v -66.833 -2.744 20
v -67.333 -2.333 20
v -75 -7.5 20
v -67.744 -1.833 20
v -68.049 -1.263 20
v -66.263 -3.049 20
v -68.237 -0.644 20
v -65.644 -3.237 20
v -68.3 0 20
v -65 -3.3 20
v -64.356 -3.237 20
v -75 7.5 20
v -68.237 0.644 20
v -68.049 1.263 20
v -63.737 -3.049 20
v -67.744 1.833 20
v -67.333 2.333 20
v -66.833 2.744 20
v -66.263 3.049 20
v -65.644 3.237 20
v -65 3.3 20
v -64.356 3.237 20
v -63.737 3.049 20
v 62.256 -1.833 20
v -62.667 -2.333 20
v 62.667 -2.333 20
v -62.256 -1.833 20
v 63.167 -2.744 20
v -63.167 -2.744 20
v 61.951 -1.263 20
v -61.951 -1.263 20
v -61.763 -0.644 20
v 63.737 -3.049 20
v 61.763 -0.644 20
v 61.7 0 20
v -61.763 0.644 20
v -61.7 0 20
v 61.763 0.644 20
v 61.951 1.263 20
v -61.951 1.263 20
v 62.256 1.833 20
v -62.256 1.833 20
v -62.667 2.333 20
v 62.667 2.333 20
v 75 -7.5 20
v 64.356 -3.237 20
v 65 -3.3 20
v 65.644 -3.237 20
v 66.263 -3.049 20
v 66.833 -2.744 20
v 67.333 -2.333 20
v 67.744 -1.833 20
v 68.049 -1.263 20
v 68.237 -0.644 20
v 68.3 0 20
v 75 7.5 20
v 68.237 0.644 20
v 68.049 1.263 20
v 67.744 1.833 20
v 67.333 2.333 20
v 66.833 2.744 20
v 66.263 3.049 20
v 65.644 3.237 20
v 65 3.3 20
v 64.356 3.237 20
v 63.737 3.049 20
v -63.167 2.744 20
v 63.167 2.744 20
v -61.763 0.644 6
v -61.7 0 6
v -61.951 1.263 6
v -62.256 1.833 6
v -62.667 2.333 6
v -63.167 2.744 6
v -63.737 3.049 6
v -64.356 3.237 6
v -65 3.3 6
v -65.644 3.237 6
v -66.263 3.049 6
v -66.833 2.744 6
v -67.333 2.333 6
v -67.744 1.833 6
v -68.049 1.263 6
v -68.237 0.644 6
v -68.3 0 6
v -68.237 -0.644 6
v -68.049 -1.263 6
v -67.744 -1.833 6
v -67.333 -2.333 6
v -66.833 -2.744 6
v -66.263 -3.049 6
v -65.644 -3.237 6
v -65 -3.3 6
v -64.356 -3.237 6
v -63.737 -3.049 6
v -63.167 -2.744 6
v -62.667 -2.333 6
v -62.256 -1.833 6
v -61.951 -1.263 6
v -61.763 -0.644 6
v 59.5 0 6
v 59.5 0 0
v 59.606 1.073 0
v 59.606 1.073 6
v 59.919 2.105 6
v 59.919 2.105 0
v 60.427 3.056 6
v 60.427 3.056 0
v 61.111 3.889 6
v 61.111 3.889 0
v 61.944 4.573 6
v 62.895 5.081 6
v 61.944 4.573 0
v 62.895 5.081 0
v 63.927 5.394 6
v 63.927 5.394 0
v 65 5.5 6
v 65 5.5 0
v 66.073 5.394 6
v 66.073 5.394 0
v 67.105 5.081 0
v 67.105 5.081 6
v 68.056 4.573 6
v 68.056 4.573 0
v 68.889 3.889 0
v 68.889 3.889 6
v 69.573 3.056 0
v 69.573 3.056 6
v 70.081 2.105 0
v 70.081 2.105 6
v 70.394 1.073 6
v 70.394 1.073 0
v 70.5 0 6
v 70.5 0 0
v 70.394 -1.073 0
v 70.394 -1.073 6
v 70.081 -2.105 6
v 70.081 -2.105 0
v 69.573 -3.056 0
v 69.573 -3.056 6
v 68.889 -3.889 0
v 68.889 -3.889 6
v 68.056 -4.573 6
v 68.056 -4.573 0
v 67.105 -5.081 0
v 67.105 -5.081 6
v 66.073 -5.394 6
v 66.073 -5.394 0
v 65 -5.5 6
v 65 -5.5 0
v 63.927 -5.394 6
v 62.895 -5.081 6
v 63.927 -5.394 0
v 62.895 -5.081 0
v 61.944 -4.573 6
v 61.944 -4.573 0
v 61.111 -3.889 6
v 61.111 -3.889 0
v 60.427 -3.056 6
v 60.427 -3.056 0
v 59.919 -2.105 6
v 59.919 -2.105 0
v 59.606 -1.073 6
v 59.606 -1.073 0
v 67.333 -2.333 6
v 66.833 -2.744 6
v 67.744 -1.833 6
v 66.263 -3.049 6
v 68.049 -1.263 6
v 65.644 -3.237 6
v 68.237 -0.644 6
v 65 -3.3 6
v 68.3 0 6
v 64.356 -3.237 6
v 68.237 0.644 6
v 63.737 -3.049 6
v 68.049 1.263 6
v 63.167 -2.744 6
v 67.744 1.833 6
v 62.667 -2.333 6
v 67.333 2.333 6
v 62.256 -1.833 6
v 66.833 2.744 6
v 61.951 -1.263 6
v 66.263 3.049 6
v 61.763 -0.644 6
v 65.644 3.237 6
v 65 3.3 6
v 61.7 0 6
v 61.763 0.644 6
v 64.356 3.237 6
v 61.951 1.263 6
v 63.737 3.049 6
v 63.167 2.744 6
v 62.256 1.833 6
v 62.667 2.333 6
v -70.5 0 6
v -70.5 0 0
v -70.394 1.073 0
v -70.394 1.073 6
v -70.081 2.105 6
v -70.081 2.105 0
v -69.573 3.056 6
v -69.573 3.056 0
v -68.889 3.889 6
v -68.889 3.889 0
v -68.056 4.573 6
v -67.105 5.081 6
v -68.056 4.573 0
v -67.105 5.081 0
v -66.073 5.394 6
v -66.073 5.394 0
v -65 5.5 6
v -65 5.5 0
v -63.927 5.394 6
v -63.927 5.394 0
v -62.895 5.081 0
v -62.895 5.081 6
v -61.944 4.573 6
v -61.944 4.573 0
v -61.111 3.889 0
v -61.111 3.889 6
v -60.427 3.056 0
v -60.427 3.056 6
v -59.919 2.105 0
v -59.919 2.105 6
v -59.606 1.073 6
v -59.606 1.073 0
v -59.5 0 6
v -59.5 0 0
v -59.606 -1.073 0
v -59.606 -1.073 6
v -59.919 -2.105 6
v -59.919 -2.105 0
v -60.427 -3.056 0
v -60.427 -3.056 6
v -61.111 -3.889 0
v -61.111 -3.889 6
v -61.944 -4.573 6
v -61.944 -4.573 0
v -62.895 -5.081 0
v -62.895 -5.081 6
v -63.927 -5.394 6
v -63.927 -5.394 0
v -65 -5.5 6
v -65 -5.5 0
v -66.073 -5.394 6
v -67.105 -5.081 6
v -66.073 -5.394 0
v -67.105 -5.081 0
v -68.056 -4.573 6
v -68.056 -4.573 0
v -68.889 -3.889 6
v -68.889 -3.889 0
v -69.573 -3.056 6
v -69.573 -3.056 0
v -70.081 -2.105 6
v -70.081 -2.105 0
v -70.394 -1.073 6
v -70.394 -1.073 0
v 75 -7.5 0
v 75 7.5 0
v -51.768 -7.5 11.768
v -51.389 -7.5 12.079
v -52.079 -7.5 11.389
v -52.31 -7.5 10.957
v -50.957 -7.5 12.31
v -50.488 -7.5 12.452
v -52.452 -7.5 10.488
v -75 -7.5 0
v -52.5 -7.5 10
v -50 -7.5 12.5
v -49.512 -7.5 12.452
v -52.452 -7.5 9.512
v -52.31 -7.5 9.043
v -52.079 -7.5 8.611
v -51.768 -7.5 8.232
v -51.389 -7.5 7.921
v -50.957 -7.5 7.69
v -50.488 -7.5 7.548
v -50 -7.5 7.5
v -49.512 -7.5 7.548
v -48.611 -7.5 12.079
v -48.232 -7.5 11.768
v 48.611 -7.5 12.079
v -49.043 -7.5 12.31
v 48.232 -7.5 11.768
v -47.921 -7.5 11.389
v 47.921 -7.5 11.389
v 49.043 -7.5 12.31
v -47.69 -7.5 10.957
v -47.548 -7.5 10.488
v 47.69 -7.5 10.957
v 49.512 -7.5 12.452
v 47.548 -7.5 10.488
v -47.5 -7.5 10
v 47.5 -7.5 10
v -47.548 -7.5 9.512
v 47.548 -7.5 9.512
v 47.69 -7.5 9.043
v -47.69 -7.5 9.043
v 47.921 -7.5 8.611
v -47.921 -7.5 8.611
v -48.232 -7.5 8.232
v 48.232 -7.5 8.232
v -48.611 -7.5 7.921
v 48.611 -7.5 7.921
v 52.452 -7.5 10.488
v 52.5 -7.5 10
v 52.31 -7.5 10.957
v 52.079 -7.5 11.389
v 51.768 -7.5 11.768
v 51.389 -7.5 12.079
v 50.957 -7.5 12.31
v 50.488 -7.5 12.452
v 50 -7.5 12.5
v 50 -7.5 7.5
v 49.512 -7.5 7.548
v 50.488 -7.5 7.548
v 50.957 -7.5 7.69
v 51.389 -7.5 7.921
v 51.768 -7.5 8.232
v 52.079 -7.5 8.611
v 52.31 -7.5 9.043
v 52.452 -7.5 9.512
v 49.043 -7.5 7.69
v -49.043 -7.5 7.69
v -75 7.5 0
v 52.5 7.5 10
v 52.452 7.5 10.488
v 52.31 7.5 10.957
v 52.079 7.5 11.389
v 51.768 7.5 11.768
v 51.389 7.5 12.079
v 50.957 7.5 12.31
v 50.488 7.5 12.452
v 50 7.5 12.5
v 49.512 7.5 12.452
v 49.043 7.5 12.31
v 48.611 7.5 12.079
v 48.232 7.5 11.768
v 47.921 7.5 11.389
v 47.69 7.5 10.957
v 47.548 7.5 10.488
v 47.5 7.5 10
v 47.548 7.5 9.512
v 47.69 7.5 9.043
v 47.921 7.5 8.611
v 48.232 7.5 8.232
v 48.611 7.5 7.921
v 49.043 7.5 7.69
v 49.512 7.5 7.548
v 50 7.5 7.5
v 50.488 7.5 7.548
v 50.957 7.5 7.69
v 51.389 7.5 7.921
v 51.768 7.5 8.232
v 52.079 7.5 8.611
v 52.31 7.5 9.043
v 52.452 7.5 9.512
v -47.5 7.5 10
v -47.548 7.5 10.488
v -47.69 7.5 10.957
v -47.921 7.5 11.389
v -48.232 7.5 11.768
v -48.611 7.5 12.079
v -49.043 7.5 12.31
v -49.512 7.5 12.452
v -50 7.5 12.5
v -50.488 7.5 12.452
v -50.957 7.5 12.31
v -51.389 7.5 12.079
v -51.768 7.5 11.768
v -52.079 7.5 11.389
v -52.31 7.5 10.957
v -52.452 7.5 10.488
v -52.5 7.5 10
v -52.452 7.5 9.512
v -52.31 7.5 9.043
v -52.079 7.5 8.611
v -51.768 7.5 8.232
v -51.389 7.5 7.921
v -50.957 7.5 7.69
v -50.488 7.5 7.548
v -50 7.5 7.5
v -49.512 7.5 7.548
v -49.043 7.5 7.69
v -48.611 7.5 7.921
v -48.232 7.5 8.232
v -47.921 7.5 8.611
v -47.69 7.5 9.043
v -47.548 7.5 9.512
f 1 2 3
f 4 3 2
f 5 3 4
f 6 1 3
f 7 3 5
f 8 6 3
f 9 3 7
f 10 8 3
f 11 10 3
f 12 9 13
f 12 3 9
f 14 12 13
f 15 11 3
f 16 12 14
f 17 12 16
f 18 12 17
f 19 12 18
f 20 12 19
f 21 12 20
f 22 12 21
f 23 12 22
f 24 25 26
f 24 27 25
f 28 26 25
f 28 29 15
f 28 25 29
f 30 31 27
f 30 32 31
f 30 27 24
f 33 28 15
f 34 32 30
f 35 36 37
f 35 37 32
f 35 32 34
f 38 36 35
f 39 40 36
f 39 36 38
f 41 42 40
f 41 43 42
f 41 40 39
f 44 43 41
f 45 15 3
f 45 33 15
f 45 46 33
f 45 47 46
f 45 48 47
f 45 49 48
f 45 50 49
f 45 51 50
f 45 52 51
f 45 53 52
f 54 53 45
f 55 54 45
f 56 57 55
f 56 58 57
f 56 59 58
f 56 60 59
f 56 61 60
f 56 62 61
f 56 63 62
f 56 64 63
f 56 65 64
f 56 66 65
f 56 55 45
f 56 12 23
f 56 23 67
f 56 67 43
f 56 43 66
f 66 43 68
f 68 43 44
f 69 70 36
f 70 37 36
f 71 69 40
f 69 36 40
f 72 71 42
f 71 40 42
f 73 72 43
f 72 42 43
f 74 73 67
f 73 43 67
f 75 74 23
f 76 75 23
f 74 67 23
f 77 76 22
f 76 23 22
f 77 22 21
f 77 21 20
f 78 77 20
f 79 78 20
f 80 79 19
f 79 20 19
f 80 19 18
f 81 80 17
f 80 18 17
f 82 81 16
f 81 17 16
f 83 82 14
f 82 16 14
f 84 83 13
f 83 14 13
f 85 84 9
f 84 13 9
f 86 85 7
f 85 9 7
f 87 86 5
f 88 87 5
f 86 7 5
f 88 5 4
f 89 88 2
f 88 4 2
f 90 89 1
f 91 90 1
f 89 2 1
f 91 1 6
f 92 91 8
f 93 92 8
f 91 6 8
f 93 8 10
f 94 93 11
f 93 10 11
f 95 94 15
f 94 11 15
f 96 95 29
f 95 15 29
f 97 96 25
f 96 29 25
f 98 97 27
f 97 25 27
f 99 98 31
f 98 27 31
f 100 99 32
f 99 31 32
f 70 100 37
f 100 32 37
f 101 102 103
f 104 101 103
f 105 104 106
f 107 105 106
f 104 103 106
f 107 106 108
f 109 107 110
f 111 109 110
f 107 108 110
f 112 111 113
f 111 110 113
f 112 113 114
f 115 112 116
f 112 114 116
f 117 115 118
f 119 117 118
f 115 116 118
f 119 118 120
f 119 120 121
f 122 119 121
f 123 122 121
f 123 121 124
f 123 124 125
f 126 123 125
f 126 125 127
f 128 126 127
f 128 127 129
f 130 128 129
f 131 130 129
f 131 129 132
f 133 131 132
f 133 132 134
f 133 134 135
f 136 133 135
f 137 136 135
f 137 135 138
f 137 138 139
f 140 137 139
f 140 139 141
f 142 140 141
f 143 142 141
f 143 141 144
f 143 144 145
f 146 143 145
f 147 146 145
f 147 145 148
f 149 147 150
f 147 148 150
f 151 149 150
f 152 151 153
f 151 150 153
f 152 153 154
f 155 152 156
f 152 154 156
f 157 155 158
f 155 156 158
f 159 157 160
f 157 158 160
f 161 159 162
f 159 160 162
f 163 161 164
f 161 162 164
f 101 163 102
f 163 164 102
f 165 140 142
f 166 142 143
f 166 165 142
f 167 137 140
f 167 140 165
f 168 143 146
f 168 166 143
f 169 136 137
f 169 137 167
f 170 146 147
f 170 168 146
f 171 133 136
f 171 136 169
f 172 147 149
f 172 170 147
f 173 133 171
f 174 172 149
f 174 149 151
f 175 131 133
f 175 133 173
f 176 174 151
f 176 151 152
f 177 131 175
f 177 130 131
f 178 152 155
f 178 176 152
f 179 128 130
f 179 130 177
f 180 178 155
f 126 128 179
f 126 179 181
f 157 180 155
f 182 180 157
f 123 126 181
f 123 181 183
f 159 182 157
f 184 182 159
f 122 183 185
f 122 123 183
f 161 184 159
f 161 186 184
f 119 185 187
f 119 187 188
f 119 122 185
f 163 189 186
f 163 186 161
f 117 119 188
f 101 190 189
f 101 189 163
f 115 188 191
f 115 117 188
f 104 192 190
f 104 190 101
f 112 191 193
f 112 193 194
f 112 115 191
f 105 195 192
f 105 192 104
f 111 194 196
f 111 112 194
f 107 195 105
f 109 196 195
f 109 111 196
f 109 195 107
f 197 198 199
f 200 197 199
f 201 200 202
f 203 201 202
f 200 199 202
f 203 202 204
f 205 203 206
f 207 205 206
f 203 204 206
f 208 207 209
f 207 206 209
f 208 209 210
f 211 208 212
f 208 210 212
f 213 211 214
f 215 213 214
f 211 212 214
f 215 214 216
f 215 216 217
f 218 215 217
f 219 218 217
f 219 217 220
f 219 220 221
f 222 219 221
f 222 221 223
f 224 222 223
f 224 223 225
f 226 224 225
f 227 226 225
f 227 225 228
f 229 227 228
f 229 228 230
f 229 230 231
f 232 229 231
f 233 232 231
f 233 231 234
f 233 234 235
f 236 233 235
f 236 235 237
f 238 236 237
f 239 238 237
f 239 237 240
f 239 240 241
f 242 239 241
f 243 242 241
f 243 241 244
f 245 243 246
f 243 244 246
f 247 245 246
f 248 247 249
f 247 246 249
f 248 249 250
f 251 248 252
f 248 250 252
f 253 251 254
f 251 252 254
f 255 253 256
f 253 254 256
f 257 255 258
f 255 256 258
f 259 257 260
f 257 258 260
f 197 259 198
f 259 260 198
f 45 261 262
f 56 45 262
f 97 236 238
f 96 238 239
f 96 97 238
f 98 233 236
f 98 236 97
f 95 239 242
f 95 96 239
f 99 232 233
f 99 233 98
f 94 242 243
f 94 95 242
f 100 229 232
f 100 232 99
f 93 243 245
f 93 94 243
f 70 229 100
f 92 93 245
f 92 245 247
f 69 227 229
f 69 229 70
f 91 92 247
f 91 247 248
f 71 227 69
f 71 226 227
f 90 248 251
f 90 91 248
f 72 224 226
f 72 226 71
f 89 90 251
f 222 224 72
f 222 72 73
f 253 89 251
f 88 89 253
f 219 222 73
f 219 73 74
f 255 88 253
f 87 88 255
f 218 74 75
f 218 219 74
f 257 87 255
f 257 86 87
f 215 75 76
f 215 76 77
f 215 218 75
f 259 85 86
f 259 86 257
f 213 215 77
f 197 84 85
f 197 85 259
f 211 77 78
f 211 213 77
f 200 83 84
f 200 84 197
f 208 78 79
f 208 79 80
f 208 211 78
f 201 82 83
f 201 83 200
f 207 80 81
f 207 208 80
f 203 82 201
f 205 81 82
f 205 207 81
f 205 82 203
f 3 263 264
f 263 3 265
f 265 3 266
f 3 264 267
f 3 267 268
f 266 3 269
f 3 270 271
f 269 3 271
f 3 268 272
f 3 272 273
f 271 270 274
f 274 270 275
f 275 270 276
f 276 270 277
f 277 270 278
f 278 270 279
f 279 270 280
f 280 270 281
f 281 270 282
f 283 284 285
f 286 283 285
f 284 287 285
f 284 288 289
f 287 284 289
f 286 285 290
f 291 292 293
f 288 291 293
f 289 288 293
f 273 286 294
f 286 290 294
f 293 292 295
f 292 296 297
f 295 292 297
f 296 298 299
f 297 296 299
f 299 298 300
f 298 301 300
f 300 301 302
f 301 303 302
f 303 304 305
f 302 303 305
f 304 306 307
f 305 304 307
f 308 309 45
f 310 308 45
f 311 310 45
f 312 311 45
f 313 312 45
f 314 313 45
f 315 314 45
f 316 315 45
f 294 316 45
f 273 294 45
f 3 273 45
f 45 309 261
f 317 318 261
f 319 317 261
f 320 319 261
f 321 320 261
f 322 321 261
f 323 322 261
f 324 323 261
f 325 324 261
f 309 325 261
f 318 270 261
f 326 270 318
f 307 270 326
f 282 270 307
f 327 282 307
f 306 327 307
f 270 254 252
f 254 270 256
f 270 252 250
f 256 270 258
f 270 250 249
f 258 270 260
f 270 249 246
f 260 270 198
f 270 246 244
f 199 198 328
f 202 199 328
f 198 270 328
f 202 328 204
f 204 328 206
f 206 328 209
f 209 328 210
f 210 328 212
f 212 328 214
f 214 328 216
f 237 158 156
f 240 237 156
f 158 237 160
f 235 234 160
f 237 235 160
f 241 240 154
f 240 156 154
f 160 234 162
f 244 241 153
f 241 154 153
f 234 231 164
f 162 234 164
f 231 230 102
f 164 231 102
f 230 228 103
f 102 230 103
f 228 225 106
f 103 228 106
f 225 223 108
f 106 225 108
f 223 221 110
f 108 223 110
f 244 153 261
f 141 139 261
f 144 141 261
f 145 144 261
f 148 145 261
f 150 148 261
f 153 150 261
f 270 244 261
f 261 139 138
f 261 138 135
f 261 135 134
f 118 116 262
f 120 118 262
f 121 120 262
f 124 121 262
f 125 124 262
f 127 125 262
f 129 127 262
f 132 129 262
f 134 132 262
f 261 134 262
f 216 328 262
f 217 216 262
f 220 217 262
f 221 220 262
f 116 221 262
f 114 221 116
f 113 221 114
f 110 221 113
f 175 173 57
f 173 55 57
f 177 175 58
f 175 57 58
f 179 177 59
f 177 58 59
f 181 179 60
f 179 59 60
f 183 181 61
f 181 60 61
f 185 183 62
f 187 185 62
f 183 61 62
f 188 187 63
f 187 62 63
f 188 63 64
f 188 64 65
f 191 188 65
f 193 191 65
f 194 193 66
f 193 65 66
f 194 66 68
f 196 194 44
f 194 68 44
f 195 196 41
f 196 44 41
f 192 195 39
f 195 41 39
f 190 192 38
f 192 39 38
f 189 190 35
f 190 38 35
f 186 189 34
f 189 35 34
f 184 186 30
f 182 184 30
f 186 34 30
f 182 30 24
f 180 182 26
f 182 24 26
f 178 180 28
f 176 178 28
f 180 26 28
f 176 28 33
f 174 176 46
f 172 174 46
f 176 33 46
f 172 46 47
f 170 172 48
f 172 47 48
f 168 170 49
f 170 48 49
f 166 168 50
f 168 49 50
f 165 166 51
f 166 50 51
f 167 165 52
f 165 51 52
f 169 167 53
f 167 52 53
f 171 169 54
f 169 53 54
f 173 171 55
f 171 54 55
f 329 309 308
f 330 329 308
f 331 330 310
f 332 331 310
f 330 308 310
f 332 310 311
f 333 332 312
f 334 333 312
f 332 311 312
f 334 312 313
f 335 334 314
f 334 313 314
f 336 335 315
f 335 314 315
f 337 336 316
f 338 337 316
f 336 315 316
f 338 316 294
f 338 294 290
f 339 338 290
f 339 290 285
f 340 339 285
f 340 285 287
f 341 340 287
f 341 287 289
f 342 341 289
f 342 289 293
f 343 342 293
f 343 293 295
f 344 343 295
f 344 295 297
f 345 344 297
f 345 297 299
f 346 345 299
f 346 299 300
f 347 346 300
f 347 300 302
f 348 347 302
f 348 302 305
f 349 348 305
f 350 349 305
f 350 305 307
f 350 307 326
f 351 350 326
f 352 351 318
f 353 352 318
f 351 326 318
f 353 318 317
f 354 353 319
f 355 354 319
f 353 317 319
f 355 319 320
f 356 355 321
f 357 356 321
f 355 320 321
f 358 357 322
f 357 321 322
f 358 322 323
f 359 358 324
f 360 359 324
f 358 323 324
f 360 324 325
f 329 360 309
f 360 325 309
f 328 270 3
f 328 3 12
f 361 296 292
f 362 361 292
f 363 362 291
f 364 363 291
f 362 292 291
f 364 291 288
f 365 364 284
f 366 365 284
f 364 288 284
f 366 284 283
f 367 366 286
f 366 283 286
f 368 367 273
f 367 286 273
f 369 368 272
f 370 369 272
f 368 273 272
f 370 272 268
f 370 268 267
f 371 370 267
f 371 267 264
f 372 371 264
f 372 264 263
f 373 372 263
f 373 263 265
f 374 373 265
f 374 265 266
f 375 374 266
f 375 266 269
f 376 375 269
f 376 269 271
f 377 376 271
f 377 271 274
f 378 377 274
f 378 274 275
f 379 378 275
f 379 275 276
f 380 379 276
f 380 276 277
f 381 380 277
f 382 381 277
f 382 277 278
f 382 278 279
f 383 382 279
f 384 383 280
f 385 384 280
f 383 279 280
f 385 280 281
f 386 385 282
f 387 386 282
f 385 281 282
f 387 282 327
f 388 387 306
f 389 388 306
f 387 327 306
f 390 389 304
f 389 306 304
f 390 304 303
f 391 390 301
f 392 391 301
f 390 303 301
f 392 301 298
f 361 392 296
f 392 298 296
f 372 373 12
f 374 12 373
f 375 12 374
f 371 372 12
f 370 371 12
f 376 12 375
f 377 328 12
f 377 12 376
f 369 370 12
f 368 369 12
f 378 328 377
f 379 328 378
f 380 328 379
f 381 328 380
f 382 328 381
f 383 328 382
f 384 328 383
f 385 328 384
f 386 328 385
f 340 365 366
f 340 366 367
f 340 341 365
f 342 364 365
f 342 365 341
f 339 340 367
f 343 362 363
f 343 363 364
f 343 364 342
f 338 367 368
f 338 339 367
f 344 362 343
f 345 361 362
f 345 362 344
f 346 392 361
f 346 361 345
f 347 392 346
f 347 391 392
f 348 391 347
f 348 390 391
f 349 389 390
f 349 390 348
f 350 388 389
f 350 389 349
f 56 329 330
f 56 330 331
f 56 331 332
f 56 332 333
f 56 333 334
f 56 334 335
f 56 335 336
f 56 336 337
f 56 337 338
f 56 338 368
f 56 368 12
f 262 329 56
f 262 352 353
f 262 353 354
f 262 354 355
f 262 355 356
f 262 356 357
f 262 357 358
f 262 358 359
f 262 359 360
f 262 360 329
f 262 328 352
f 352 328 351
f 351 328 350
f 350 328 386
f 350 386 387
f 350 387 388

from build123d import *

# Parameters (mm, degrees)
SKETCH_1_W                     = 150
SKETCH_1_H                     = 15
EXTRUDE_1_DEPTH                = 20
HOLE_WIZARD_M6_1_D             = 5
HOLE_WIZARD_M6_1_2_D           = 6.6
HOLE_WIZARD_M6_1_2_CBORE_D     = 11
HOLE_WIZARD_M6_1_2_CBORE_DEPTH = 6


with BuildPart() as part:
    # 草圖1 → 伸長1 (new body)
    with BuildSketch(Plane.XY):
        Rectangle(SKETCH_1_W, SKETCH_1_H)
    extrude(amount=EXTRUDE_1_DEPTH)

    # Hole Wizard M6 _1 (through all)
    with Locations(Plane(origin=(0, 7.5, 0), x_dir=(-1, 0, 0), z_dir=(0, 1, 0))):
        with Locations((50, 10), (-50, 10)):
            Hole(HOLE_WIZARD_M6_1_D / 2)

    # Hole Wizard M6 _1 2 (through all)
    with Locations(Plane(origin=(0, 0, 0), x_dir=(-1, 0, 0), z_dir=(0, 0, -1))):
        with Locations((65, 0), (-65, 0)):
            CounterBoreHole(HOLE_WIZARD_M6_1_2_D / 2, HOLE_WIZARD_M6_1_2_CBORE_D / 2, HOLE_WIZARD_M6_1_2_CBORE_DEPTH)


solid = part.part
